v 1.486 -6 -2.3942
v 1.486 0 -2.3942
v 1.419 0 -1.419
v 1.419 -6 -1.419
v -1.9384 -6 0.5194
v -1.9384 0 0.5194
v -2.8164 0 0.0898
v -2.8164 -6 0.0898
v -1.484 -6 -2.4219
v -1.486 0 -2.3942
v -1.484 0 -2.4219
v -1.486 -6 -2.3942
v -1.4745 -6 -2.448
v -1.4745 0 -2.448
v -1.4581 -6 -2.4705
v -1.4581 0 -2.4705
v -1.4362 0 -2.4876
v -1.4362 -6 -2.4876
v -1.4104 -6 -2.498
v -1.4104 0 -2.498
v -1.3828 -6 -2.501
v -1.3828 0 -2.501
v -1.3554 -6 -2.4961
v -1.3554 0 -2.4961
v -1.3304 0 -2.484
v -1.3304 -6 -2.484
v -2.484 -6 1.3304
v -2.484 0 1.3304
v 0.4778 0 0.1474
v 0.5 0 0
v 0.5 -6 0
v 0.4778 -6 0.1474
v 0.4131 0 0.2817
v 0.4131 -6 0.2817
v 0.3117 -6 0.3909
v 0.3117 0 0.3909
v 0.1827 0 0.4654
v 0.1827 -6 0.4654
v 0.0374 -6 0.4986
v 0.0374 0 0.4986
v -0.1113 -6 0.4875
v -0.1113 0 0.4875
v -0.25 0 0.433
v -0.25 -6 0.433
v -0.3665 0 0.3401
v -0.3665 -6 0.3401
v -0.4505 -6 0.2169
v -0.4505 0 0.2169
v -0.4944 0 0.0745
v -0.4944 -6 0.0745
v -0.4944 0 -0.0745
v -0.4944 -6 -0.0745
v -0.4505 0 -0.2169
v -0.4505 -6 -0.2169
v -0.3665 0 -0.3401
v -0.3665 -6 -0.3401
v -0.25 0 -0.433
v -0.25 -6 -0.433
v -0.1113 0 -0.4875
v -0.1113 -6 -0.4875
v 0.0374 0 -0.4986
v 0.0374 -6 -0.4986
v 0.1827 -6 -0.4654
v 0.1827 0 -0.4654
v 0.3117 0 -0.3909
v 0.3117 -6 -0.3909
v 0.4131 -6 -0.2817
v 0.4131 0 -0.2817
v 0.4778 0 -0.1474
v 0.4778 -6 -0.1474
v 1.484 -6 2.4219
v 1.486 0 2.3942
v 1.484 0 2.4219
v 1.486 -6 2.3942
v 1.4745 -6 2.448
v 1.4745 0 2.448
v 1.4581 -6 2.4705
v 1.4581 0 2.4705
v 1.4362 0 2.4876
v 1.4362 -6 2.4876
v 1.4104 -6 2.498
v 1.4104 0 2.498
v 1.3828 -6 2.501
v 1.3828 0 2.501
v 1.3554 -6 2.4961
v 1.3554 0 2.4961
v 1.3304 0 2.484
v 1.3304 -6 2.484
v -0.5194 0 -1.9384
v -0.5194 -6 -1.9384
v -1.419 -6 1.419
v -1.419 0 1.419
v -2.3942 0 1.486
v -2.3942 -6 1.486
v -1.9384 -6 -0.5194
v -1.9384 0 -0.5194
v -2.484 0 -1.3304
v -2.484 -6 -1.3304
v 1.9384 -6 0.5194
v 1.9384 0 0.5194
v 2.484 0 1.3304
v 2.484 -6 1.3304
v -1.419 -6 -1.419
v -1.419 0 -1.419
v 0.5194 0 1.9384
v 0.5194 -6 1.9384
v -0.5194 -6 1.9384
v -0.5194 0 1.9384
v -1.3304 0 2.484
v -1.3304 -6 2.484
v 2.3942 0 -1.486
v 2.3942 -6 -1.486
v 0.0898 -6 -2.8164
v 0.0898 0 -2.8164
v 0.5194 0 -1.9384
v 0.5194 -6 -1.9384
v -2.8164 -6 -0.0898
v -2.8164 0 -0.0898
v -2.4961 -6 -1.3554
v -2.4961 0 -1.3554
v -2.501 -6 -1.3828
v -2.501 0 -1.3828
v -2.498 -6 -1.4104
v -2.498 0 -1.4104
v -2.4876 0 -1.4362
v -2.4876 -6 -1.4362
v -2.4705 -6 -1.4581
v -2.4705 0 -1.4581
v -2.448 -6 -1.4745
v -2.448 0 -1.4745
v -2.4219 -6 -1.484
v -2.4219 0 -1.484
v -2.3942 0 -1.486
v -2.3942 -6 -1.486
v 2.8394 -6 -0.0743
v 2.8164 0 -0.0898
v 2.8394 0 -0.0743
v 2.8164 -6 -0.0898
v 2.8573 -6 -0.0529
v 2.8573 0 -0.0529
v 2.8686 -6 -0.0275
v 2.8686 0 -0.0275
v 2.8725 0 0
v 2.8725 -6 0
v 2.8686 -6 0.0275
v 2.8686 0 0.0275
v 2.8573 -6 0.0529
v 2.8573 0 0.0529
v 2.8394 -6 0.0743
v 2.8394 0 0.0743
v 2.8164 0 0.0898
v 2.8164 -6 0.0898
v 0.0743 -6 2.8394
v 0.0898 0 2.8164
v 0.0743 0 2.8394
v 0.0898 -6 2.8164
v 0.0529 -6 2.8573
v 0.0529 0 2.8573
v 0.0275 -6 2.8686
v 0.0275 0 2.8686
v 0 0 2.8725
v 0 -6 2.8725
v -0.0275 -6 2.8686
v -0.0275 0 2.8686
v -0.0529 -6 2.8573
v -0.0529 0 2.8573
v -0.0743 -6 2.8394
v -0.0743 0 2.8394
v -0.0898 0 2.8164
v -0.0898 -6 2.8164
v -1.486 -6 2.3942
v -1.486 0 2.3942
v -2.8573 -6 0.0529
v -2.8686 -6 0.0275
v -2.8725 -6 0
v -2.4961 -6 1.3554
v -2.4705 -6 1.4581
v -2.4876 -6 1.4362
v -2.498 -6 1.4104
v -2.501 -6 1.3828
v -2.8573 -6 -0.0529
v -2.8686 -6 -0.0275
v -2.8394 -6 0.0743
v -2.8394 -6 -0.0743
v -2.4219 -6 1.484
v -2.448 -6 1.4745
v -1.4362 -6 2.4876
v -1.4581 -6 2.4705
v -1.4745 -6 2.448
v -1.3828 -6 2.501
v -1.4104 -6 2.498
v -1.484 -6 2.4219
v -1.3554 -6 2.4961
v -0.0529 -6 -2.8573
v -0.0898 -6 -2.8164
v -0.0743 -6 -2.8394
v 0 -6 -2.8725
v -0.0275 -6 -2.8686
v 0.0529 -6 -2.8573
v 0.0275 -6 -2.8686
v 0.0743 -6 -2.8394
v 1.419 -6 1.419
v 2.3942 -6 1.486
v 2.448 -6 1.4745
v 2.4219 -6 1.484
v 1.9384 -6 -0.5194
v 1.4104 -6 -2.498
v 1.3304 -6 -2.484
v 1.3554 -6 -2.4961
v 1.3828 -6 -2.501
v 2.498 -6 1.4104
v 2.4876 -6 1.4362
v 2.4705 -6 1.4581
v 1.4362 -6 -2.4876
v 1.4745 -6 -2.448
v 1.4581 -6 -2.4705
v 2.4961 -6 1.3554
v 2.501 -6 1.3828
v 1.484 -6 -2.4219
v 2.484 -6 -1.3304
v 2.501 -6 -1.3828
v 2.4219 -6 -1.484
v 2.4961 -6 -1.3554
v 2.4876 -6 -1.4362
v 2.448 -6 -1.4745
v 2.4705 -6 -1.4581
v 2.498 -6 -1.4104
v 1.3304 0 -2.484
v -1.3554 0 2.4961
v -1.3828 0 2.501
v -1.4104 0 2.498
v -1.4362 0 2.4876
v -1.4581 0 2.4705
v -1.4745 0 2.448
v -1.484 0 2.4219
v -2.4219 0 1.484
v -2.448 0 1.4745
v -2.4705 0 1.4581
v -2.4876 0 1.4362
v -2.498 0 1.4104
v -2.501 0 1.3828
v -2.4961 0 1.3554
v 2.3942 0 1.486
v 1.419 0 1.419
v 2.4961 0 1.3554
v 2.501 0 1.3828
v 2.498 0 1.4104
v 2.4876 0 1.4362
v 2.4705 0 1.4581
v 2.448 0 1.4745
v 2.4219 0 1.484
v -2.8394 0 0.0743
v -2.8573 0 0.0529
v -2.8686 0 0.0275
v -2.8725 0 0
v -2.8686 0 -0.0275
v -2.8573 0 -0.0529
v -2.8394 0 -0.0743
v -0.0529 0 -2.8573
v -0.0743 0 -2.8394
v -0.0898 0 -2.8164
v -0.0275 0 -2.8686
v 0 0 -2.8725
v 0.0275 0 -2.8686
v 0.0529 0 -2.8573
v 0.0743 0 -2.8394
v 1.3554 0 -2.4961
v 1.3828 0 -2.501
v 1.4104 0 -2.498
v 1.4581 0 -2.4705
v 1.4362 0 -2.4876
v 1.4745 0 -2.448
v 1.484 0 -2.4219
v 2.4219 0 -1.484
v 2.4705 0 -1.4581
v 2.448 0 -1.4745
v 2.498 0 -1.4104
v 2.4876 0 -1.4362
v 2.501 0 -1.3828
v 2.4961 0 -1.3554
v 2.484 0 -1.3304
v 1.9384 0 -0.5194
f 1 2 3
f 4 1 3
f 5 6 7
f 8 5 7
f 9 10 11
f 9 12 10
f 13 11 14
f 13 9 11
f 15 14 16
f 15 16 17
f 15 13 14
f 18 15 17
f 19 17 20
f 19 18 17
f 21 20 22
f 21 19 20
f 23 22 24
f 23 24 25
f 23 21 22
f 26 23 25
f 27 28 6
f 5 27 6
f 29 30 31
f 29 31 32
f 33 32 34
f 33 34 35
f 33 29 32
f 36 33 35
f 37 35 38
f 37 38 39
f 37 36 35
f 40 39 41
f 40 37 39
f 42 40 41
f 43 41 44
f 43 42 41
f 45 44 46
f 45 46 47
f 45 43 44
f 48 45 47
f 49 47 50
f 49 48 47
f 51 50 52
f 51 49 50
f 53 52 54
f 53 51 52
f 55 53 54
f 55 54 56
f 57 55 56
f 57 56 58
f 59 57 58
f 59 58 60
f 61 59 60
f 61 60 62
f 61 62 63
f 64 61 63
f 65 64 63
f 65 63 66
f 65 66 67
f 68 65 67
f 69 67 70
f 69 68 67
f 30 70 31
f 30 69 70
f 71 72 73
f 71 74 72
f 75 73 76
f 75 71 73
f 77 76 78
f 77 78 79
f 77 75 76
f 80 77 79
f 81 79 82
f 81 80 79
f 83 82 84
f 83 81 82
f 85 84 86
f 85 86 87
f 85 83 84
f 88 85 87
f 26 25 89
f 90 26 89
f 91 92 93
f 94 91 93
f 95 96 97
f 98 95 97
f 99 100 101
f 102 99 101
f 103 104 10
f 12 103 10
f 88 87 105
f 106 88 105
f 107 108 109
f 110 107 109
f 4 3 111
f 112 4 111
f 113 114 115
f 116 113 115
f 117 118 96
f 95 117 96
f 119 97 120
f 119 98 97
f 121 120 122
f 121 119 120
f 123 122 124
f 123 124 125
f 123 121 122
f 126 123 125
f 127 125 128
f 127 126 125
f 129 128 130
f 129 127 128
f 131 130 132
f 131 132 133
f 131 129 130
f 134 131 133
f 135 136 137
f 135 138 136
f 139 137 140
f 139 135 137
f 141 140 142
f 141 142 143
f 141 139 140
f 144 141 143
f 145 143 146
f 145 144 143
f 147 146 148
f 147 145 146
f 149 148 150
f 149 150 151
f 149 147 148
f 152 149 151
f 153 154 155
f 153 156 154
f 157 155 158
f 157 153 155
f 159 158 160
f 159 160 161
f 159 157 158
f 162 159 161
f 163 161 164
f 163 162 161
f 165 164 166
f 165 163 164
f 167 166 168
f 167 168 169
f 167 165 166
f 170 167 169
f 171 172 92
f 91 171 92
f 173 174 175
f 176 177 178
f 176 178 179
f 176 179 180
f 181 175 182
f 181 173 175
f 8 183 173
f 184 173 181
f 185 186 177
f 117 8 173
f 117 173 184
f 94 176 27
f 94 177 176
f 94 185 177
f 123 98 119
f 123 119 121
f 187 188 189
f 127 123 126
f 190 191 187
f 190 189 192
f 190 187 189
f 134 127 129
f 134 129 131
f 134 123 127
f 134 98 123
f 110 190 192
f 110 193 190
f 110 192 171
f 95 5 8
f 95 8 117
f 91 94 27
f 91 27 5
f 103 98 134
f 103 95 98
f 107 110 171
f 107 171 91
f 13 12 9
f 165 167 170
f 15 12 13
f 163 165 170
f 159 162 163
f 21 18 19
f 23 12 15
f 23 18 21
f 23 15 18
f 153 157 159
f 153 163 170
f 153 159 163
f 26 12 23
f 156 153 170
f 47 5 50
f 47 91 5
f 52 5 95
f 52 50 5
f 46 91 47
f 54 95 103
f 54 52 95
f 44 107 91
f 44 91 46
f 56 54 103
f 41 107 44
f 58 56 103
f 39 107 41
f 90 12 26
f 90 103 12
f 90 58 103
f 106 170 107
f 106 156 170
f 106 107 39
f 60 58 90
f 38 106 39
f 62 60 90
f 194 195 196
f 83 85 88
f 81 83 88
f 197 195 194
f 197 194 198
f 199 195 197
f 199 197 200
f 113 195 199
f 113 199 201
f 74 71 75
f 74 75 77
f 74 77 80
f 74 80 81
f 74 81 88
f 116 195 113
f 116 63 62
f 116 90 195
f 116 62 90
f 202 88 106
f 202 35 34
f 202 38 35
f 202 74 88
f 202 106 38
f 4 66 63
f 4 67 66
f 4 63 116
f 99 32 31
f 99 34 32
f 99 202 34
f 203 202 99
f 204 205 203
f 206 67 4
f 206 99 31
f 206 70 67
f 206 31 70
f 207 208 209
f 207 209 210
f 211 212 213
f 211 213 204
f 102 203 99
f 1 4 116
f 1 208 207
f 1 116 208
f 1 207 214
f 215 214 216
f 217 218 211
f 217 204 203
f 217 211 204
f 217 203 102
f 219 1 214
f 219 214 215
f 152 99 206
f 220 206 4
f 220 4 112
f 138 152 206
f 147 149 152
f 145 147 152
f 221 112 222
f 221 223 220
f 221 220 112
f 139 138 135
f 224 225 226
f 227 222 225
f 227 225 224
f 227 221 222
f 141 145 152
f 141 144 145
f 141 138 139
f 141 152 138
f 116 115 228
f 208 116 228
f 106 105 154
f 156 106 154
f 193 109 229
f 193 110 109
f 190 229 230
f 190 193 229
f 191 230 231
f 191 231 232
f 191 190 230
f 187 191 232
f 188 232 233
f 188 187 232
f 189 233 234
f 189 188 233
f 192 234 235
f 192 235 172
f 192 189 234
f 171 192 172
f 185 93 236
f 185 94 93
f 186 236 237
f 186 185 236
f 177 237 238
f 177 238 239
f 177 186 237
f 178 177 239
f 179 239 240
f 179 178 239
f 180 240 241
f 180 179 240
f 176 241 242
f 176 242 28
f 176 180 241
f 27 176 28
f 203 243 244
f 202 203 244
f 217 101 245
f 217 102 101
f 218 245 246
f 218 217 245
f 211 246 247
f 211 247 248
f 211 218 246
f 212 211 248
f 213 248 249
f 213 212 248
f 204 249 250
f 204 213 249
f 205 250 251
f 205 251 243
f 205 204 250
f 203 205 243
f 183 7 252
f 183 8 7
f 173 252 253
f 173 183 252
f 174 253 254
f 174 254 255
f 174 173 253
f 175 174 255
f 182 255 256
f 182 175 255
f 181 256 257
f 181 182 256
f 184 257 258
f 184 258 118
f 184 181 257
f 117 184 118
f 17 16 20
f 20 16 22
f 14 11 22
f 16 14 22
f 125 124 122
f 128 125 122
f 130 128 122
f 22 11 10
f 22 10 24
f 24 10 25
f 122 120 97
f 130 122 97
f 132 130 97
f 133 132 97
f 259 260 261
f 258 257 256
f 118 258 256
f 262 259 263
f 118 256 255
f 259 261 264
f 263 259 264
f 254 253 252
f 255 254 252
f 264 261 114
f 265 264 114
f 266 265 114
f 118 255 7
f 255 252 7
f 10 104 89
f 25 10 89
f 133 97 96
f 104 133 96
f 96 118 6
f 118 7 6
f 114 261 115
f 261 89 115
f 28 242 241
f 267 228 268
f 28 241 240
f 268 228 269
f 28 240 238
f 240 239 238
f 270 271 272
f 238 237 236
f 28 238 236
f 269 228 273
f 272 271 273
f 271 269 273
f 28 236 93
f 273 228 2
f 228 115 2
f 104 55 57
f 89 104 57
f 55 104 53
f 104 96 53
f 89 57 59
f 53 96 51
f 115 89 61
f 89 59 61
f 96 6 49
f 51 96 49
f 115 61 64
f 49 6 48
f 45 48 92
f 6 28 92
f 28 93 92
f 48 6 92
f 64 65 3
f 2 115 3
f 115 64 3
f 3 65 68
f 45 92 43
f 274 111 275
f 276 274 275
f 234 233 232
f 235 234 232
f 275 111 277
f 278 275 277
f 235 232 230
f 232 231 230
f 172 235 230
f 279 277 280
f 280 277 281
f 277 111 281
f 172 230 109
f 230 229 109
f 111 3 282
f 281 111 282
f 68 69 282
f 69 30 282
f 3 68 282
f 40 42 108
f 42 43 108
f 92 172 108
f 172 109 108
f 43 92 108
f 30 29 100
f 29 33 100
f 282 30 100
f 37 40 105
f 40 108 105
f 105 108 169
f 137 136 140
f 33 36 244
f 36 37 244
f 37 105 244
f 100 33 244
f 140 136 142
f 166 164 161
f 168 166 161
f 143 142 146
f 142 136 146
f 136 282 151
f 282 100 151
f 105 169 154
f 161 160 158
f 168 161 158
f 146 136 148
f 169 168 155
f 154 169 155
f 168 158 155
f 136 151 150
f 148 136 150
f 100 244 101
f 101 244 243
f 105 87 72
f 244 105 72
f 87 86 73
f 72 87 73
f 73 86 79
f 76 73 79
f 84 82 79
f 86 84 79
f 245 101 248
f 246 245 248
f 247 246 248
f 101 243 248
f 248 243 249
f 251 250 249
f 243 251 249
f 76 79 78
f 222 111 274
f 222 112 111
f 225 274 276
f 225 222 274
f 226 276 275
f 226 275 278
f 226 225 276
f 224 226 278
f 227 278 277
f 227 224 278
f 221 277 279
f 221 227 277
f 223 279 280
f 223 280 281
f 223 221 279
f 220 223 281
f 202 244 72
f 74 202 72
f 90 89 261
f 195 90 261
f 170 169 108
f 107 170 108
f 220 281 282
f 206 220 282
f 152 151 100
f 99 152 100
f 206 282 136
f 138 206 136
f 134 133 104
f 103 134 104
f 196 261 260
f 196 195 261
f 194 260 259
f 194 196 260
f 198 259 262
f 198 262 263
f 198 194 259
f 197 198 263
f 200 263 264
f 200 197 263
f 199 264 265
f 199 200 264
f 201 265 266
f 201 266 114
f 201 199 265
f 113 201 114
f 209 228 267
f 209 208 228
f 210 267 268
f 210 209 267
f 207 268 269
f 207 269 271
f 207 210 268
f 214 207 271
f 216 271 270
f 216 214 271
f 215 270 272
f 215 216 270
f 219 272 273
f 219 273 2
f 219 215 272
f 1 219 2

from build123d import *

# Parameters (mm, degrees)
F0_R     = 0.5
F1_DEPTH = 6
F2_DEPTH = 6
F3_R     = 0.1
F4_COUNT = 12


with BuildPart() as f1:
    # F0 (on Front) → F1 (new body)
    with BuildSketch(Plane.XZ):
        with BuildLine():
            ThreePointArc((-0.5233333333, 1.9303166119), (-1.2151817422, -1.588500341), (2, 0))
            ThreePointArc((2, 0), (1.588500341, 1.2151817422), (0.5233333333, 1.9303166119))
            ThreePointArc((0.5233333333, 1.9303166119), (0, 2), (-0.5233333333, 1.9303166119))
        make_face()
        Circle(F0_R, mode=Mode.SUBTRACT)
    extrude(amount=F1_DEPTH)



with BuildPart() as f2:
    # F0 (on Front) → F2 (new body)
    with BuildSketch(Plane.XZ):
        with BuildLine():
            ThreePointArc((-0.5233333333, 1.9303166119), (0, 2), (0.5233333333, 1.9303166119))
            Line((0.5233333333, 1.9303166119), (0, 3))
            Line((0, 3), (-0.5233333333, 1.9303166119))
        make_face()
    extrude(amount=F2_DEPTH)

    # F3
    f3_edges = [f2.edges().sort_by_distance(p)[0] for p in [
        (0, -3, 3),
    ]]
    fillet(f3_edges, radius=F3_R)


with BuildPart() as f1_1:
    add(f1.part)

    add(f2.part)  # F4 merges F2
    # F4: F2 ×12 about axis
    f4_axis = Axis((0, 0, 0), (0, -1, 0))
    for i in range(1, F4_COUNT):
        add(f2.part.rotate(f4_axis, i * 360 / F4_COUNT))


solid = f1_1.part
